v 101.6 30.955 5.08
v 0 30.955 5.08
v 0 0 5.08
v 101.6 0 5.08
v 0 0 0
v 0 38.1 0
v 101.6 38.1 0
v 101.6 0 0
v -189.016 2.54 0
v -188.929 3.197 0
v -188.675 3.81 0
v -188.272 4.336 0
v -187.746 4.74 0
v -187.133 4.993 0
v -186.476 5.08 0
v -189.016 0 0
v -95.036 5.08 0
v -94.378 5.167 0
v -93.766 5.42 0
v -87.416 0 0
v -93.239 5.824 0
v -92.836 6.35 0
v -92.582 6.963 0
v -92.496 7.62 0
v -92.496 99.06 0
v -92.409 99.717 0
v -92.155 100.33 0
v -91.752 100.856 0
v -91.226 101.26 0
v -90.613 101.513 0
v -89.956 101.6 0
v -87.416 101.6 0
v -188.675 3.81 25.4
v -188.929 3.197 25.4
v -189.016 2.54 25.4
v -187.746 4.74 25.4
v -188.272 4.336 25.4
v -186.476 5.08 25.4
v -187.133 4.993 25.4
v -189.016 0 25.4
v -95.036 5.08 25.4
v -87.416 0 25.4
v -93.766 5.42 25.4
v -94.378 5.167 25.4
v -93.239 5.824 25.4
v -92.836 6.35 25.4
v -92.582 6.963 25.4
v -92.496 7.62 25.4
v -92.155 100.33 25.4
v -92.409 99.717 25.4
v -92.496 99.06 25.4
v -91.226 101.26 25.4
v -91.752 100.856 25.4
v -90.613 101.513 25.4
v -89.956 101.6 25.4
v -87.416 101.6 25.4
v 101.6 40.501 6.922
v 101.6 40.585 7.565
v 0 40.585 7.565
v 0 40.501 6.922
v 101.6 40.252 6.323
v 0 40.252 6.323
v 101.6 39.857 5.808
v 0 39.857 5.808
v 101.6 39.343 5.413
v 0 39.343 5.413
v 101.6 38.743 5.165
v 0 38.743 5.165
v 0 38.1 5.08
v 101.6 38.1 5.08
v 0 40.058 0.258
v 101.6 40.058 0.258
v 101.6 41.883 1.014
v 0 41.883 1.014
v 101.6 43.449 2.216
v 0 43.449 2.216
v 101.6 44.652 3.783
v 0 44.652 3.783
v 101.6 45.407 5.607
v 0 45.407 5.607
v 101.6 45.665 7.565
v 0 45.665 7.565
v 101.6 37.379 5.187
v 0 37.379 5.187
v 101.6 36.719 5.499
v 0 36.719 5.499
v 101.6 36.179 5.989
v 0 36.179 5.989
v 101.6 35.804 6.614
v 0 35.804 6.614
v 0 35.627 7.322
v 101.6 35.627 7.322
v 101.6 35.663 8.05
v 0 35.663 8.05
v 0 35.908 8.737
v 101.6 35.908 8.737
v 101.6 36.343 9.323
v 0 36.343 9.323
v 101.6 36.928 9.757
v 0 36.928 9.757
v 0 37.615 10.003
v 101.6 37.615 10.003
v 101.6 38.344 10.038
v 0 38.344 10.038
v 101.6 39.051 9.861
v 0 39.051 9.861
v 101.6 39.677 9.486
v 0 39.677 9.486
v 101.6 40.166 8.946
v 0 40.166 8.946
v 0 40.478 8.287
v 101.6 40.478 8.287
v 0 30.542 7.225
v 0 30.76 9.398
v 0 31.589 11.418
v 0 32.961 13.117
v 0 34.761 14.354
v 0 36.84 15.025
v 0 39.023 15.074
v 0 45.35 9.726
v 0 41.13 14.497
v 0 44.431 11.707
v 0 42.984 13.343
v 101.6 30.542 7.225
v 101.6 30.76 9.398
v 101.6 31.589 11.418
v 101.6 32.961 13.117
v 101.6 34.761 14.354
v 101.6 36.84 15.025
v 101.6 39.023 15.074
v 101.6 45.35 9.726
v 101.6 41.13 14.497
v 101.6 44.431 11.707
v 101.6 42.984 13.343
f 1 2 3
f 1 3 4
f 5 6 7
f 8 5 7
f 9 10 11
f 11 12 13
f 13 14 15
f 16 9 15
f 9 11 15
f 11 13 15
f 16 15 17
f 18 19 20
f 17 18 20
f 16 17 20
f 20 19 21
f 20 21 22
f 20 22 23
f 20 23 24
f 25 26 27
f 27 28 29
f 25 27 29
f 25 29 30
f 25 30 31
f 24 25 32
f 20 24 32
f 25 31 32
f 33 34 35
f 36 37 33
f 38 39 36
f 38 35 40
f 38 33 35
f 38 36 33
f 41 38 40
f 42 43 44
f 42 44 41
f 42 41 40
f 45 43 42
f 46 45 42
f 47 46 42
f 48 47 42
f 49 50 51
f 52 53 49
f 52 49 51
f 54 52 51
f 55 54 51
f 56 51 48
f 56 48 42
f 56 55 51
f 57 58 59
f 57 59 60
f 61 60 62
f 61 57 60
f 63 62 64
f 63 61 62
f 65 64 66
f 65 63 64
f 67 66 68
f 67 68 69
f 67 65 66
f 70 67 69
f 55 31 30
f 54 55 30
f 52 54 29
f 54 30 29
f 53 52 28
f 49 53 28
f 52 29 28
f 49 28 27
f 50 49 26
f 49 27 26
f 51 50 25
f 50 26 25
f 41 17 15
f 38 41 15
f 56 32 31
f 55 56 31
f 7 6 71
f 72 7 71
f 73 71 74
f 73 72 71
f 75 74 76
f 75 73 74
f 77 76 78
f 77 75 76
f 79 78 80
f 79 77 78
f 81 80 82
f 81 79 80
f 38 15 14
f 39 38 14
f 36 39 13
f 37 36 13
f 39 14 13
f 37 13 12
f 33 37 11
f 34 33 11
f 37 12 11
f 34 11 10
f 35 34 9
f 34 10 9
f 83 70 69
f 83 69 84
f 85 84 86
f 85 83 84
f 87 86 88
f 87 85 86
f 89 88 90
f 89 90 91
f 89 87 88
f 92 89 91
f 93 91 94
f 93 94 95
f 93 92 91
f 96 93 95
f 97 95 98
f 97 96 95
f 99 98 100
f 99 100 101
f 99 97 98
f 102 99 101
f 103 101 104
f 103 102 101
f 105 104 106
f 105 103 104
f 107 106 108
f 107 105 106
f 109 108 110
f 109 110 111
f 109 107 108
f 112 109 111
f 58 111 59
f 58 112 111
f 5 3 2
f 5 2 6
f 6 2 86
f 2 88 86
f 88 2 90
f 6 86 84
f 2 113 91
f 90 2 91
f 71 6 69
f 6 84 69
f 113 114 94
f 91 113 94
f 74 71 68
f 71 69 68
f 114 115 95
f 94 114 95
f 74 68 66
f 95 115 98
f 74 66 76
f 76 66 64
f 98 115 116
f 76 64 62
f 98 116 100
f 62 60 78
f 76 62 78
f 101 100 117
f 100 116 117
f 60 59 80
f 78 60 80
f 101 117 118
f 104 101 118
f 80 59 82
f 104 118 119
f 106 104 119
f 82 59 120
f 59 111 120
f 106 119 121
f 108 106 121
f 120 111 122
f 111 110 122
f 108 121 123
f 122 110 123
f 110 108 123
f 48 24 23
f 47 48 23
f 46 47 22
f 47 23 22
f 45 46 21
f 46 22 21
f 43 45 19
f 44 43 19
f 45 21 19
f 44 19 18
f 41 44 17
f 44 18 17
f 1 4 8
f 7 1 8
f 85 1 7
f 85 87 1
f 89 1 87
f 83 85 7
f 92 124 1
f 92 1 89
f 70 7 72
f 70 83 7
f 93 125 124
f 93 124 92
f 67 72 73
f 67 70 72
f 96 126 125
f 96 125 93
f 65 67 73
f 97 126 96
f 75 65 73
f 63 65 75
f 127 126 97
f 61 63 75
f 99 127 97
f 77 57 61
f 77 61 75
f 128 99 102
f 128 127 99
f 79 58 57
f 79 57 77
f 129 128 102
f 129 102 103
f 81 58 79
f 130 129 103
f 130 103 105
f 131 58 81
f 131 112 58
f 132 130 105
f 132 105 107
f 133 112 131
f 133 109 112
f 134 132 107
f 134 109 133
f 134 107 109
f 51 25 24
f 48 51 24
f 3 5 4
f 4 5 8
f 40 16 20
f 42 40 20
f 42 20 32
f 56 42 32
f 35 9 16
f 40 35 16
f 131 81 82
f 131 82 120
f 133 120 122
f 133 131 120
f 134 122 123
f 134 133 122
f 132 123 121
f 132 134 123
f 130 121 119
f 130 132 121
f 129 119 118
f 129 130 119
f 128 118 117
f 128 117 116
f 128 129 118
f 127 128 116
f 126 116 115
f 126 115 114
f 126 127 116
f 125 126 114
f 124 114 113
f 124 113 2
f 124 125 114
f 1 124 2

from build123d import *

# Parameters (mm, degrees)
F0_W     = 101.6
F0_H     = 38.1
F1_DEPTH = 5.08
F3_DEPTH = 101.6
F5_DEPTH = 25.4


with BuildPart() as f1:
    # F0 (on Top) → F1 (new body)
    with BuildSketch(Plane.XY):
        with Locations((50.8, 19.05)):
            Rectangle(F0_W, F0_H)
    extrude(amount=F1_DEPTH)

    # F2 (on face) → F3 (join)
    with BuildSketch(Plane.YZ.offset(101.6)):
        with BuildLine():
            Line((38.1, 5.08), (38.1, 0))
            ThreePointArc((38.1, 0), (43.449413, 2.215799), (45.665212, 7.565212))
            ThreePointArc((45.665212, 7.565212), (36.839786, 15.024722), (30.954641, 5.08))
            Line((30.954641, 5.08), (38.1, 5.08))
        make_face()
        with BuildLine():
            ThreePointArc((40.585212, 7.565212), (39.85731, 5.807902), (38.1, 5.08))
            ThreePointArc((38.1, 5.08), (36.34269, 9.322522), (40.585212, 7.565212))
        make_face(mode=Mode.SUBTRACT)
    extrude(amount=-F3_DEPTH)


with BuildPart() as f5:
    # F4 (on Top) → F5 (new body)
    with BuildSketch(Plane.XY):
        with BuildLine():
            Line((-189.015545, 0), (-87.415545, 0))
            Line((-87.415545, 0), (-87.415545, 101.6))
            Line((-87.415545, 101.6), (-89.955545, 101.6))
            ThreePointArc((-89.955545, 101.6), (-91.751596, 100.856051), (-92.495545, 99.06))
            Line((-92.495545, 99.06), (-92.495545, 7.62))
            ThreePointArc((-92.495545, 7.62), (-93.239494, 5.823949), (-95.035545, 5.08))
            Line((-95.035545, 5.08), (-186.475545, 5.08))
            ThreePointArc((-186.475545, 5.08), (-188.271596, 4.336051), (-189.015545, 2.54))
            Line((-189.015545, 2.54), (-189.015545, 0))
        make_face()
    extrude(amount=F5_DEPTH)


solid = Compound([f1.part, f5.part])
